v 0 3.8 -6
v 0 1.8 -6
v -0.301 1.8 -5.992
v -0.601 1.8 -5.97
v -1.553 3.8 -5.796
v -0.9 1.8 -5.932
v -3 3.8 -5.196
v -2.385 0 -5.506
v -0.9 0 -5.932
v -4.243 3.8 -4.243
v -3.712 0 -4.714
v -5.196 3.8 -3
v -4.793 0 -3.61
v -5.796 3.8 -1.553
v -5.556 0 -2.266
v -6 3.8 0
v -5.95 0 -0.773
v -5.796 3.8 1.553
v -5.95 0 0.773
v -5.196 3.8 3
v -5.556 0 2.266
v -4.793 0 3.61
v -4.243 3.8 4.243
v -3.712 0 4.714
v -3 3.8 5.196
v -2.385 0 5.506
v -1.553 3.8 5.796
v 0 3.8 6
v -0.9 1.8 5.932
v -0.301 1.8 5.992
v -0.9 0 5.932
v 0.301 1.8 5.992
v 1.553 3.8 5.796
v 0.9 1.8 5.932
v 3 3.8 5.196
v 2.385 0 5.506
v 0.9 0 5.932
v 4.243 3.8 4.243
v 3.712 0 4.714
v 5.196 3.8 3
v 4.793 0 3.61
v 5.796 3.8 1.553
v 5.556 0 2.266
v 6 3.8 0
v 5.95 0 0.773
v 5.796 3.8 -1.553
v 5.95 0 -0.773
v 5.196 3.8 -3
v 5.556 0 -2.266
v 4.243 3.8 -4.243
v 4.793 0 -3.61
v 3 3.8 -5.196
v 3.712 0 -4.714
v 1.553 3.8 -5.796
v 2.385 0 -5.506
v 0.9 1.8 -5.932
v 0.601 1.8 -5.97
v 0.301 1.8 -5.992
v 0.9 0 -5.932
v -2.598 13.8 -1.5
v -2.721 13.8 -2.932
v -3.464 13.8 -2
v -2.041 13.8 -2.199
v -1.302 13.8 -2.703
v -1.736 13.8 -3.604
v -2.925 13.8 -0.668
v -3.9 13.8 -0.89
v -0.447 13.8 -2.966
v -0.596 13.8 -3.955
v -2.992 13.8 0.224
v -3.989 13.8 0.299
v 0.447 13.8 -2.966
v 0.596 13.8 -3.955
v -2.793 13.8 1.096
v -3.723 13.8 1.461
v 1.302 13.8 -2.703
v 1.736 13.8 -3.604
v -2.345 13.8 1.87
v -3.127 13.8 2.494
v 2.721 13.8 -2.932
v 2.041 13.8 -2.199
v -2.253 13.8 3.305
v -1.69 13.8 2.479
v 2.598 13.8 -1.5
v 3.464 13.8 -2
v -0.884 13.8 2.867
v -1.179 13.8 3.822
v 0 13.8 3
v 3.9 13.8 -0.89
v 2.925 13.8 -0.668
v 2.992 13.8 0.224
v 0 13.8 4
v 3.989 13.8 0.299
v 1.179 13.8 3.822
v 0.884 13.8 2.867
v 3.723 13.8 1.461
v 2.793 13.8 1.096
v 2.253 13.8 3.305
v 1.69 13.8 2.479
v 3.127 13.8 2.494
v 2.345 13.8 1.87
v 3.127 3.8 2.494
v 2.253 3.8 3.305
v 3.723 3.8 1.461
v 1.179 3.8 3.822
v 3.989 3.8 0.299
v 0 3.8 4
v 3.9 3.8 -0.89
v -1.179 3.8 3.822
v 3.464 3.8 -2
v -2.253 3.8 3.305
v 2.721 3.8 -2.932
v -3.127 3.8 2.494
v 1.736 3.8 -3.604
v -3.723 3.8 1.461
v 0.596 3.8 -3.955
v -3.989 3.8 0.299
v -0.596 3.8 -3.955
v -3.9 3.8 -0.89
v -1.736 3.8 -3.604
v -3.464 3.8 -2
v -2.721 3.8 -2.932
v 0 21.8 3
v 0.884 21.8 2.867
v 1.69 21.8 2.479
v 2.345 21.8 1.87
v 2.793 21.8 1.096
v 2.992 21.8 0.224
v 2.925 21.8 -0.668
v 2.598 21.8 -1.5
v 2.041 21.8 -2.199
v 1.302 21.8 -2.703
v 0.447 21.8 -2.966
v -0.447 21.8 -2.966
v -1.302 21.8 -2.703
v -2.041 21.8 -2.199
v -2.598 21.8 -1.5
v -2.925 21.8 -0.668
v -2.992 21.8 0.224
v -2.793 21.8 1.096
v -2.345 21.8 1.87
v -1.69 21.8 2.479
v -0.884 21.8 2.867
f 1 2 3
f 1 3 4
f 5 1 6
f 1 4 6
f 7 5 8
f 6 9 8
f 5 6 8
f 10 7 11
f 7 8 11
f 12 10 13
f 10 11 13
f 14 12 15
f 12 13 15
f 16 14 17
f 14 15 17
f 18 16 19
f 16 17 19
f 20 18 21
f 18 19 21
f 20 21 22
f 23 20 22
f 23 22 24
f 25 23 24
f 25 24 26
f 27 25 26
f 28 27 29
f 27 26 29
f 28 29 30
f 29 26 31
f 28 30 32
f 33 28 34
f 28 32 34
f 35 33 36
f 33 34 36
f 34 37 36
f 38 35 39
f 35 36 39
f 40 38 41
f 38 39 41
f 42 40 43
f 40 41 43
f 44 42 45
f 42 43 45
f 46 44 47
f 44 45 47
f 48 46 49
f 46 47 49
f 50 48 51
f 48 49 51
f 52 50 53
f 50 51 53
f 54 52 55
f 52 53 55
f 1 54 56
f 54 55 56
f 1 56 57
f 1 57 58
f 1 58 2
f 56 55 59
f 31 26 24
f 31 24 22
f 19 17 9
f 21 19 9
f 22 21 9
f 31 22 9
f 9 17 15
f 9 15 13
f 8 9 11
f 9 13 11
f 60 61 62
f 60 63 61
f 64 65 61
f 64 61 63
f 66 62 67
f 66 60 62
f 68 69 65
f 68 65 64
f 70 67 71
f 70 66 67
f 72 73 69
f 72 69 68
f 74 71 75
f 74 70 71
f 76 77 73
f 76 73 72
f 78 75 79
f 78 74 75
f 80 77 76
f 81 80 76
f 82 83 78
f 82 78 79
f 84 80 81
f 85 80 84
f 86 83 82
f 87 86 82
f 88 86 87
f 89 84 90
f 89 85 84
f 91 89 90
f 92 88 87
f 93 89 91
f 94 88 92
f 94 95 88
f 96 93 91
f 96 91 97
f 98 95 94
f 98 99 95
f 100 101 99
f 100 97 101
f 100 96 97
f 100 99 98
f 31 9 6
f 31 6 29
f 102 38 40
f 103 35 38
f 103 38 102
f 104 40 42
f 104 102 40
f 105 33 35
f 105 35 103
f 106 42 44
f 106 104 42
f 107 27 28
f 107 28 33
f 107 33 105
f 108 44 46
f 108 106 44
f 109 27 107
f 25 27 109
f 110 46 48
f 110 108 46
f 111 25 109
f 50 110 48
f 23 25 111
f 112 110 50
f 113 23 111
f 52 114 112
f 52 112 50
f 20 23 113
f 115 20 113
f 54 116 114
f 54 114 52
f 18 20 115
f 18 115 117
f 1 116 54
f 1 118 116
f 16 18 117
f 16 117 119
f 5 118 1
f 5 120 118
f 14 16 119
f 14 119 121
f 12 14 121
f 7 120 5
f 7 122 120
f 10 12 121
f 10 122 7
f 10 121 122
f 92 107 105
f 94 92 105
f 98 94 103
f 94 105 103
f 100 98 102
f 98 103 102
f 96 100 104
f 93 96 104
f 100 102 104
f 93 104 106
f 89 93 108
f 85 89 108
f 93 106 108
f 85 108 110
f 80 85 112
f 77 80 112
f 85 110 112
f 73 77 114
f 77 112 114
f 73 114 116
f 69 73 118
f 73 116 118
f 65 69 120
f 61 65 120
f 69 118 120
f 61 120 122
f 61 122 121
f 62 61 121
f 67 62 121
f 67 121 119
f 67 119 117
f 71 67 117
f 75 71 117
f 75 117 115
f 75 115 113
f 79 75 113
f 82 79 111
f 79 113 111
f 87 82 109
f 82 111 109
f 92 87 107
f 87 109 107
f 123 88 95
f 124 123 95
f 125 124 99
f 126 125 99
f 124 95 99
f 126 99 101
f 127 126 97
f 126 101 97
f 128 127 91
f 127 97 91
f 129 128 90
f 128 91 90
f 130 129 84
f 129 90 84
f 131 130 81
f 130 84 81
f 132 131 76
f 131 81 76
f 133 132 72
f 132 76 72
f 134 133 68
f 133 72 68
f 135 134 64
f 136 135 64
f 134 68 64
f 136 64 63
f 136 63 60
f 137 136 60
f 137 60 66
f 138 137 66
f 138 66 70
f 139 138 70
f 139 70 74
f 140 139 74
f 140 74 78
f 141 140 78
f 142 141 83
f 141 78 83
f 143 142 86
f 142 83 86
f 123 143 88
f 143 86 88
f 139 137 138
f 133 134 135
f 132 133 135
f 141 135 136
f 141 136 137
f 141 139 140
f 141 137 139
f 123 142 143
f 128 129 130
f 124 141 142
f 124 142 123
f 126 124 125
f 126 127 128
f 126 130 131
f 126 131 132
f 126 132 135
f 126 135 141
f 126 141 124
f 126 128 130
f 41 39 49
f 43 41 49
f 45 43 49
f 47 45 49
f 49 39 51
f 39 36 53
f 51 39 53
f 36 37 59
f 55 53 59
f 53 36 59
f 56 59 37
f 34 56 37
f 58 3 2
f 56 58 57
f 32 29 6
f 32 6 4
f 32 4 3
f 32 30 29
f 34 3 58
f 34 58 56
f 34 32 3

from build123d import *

# Parameters (mm, degrees)
SKETCH_1_R          = 6
EXTRUDE_1_DEPTH     = 3.8
SKETCH_2_R          = 4
EXTRUDE_2_DEPTH     = 10
SKETCH_3_R          = 3
EXTRUDE_3_DEPTH     = 8
SKETCH_4_W          = 1.8
SKETCH_4_H          = 13.920962764
CUT_EXTRUDE_1_DEPTH = 1.8


with BuildPart() as part:
    # 草图1 → 凸台-拉伸1 (new body)
    with BuildSketch(Plane(origin=(0, 0, 0), x_dir=(1, 0, 0), z_dir=(0, 1, 0))):
        with Locations(Location((0, 0, 0), (0, 0, 90))):
            Circle(SKETCH_1_R)
    extrude(amount=EXTRUDE_1_DEPTH)

    # 草图2 → 凸台-拉伸2 (add)
    with BuildSketch(Plane(origin=(0, 3.8, 0), x_dir=(1, 0, 0), z_dir=(0, 1, 0))):
        with Locations(Location((0, 0, 0), (0, 0, 270))):
            Circle(SKETCH_2_R)
    extrude(amount=EXTRUDE_2_DEPTH)

    # 草图3 → 凸台-拉伸3 (add)
    with BuildSketch(Plane(origin=(0, 13.8, 0), x_dir=(1, 0, 0), z_dir=(0, 1, 0))):
        with Locations(Location((0, 0, 0), (0, 0, 270))):
            Circle(SKETCH_3_R)
    extrude(amount=EXTRUDE_3_DEPTH)

    # 草图4 → 切除-拉伸1 (cut)
    with BuildSketch(Plane.XZ):
        Rectangle(SKETCH_4_W, SKETCH_4_H)
    extrude(amount=-CUT_EXTRUDE_1_DEPTH, mode=Mode.SUBTRACT)


solid = part.part
